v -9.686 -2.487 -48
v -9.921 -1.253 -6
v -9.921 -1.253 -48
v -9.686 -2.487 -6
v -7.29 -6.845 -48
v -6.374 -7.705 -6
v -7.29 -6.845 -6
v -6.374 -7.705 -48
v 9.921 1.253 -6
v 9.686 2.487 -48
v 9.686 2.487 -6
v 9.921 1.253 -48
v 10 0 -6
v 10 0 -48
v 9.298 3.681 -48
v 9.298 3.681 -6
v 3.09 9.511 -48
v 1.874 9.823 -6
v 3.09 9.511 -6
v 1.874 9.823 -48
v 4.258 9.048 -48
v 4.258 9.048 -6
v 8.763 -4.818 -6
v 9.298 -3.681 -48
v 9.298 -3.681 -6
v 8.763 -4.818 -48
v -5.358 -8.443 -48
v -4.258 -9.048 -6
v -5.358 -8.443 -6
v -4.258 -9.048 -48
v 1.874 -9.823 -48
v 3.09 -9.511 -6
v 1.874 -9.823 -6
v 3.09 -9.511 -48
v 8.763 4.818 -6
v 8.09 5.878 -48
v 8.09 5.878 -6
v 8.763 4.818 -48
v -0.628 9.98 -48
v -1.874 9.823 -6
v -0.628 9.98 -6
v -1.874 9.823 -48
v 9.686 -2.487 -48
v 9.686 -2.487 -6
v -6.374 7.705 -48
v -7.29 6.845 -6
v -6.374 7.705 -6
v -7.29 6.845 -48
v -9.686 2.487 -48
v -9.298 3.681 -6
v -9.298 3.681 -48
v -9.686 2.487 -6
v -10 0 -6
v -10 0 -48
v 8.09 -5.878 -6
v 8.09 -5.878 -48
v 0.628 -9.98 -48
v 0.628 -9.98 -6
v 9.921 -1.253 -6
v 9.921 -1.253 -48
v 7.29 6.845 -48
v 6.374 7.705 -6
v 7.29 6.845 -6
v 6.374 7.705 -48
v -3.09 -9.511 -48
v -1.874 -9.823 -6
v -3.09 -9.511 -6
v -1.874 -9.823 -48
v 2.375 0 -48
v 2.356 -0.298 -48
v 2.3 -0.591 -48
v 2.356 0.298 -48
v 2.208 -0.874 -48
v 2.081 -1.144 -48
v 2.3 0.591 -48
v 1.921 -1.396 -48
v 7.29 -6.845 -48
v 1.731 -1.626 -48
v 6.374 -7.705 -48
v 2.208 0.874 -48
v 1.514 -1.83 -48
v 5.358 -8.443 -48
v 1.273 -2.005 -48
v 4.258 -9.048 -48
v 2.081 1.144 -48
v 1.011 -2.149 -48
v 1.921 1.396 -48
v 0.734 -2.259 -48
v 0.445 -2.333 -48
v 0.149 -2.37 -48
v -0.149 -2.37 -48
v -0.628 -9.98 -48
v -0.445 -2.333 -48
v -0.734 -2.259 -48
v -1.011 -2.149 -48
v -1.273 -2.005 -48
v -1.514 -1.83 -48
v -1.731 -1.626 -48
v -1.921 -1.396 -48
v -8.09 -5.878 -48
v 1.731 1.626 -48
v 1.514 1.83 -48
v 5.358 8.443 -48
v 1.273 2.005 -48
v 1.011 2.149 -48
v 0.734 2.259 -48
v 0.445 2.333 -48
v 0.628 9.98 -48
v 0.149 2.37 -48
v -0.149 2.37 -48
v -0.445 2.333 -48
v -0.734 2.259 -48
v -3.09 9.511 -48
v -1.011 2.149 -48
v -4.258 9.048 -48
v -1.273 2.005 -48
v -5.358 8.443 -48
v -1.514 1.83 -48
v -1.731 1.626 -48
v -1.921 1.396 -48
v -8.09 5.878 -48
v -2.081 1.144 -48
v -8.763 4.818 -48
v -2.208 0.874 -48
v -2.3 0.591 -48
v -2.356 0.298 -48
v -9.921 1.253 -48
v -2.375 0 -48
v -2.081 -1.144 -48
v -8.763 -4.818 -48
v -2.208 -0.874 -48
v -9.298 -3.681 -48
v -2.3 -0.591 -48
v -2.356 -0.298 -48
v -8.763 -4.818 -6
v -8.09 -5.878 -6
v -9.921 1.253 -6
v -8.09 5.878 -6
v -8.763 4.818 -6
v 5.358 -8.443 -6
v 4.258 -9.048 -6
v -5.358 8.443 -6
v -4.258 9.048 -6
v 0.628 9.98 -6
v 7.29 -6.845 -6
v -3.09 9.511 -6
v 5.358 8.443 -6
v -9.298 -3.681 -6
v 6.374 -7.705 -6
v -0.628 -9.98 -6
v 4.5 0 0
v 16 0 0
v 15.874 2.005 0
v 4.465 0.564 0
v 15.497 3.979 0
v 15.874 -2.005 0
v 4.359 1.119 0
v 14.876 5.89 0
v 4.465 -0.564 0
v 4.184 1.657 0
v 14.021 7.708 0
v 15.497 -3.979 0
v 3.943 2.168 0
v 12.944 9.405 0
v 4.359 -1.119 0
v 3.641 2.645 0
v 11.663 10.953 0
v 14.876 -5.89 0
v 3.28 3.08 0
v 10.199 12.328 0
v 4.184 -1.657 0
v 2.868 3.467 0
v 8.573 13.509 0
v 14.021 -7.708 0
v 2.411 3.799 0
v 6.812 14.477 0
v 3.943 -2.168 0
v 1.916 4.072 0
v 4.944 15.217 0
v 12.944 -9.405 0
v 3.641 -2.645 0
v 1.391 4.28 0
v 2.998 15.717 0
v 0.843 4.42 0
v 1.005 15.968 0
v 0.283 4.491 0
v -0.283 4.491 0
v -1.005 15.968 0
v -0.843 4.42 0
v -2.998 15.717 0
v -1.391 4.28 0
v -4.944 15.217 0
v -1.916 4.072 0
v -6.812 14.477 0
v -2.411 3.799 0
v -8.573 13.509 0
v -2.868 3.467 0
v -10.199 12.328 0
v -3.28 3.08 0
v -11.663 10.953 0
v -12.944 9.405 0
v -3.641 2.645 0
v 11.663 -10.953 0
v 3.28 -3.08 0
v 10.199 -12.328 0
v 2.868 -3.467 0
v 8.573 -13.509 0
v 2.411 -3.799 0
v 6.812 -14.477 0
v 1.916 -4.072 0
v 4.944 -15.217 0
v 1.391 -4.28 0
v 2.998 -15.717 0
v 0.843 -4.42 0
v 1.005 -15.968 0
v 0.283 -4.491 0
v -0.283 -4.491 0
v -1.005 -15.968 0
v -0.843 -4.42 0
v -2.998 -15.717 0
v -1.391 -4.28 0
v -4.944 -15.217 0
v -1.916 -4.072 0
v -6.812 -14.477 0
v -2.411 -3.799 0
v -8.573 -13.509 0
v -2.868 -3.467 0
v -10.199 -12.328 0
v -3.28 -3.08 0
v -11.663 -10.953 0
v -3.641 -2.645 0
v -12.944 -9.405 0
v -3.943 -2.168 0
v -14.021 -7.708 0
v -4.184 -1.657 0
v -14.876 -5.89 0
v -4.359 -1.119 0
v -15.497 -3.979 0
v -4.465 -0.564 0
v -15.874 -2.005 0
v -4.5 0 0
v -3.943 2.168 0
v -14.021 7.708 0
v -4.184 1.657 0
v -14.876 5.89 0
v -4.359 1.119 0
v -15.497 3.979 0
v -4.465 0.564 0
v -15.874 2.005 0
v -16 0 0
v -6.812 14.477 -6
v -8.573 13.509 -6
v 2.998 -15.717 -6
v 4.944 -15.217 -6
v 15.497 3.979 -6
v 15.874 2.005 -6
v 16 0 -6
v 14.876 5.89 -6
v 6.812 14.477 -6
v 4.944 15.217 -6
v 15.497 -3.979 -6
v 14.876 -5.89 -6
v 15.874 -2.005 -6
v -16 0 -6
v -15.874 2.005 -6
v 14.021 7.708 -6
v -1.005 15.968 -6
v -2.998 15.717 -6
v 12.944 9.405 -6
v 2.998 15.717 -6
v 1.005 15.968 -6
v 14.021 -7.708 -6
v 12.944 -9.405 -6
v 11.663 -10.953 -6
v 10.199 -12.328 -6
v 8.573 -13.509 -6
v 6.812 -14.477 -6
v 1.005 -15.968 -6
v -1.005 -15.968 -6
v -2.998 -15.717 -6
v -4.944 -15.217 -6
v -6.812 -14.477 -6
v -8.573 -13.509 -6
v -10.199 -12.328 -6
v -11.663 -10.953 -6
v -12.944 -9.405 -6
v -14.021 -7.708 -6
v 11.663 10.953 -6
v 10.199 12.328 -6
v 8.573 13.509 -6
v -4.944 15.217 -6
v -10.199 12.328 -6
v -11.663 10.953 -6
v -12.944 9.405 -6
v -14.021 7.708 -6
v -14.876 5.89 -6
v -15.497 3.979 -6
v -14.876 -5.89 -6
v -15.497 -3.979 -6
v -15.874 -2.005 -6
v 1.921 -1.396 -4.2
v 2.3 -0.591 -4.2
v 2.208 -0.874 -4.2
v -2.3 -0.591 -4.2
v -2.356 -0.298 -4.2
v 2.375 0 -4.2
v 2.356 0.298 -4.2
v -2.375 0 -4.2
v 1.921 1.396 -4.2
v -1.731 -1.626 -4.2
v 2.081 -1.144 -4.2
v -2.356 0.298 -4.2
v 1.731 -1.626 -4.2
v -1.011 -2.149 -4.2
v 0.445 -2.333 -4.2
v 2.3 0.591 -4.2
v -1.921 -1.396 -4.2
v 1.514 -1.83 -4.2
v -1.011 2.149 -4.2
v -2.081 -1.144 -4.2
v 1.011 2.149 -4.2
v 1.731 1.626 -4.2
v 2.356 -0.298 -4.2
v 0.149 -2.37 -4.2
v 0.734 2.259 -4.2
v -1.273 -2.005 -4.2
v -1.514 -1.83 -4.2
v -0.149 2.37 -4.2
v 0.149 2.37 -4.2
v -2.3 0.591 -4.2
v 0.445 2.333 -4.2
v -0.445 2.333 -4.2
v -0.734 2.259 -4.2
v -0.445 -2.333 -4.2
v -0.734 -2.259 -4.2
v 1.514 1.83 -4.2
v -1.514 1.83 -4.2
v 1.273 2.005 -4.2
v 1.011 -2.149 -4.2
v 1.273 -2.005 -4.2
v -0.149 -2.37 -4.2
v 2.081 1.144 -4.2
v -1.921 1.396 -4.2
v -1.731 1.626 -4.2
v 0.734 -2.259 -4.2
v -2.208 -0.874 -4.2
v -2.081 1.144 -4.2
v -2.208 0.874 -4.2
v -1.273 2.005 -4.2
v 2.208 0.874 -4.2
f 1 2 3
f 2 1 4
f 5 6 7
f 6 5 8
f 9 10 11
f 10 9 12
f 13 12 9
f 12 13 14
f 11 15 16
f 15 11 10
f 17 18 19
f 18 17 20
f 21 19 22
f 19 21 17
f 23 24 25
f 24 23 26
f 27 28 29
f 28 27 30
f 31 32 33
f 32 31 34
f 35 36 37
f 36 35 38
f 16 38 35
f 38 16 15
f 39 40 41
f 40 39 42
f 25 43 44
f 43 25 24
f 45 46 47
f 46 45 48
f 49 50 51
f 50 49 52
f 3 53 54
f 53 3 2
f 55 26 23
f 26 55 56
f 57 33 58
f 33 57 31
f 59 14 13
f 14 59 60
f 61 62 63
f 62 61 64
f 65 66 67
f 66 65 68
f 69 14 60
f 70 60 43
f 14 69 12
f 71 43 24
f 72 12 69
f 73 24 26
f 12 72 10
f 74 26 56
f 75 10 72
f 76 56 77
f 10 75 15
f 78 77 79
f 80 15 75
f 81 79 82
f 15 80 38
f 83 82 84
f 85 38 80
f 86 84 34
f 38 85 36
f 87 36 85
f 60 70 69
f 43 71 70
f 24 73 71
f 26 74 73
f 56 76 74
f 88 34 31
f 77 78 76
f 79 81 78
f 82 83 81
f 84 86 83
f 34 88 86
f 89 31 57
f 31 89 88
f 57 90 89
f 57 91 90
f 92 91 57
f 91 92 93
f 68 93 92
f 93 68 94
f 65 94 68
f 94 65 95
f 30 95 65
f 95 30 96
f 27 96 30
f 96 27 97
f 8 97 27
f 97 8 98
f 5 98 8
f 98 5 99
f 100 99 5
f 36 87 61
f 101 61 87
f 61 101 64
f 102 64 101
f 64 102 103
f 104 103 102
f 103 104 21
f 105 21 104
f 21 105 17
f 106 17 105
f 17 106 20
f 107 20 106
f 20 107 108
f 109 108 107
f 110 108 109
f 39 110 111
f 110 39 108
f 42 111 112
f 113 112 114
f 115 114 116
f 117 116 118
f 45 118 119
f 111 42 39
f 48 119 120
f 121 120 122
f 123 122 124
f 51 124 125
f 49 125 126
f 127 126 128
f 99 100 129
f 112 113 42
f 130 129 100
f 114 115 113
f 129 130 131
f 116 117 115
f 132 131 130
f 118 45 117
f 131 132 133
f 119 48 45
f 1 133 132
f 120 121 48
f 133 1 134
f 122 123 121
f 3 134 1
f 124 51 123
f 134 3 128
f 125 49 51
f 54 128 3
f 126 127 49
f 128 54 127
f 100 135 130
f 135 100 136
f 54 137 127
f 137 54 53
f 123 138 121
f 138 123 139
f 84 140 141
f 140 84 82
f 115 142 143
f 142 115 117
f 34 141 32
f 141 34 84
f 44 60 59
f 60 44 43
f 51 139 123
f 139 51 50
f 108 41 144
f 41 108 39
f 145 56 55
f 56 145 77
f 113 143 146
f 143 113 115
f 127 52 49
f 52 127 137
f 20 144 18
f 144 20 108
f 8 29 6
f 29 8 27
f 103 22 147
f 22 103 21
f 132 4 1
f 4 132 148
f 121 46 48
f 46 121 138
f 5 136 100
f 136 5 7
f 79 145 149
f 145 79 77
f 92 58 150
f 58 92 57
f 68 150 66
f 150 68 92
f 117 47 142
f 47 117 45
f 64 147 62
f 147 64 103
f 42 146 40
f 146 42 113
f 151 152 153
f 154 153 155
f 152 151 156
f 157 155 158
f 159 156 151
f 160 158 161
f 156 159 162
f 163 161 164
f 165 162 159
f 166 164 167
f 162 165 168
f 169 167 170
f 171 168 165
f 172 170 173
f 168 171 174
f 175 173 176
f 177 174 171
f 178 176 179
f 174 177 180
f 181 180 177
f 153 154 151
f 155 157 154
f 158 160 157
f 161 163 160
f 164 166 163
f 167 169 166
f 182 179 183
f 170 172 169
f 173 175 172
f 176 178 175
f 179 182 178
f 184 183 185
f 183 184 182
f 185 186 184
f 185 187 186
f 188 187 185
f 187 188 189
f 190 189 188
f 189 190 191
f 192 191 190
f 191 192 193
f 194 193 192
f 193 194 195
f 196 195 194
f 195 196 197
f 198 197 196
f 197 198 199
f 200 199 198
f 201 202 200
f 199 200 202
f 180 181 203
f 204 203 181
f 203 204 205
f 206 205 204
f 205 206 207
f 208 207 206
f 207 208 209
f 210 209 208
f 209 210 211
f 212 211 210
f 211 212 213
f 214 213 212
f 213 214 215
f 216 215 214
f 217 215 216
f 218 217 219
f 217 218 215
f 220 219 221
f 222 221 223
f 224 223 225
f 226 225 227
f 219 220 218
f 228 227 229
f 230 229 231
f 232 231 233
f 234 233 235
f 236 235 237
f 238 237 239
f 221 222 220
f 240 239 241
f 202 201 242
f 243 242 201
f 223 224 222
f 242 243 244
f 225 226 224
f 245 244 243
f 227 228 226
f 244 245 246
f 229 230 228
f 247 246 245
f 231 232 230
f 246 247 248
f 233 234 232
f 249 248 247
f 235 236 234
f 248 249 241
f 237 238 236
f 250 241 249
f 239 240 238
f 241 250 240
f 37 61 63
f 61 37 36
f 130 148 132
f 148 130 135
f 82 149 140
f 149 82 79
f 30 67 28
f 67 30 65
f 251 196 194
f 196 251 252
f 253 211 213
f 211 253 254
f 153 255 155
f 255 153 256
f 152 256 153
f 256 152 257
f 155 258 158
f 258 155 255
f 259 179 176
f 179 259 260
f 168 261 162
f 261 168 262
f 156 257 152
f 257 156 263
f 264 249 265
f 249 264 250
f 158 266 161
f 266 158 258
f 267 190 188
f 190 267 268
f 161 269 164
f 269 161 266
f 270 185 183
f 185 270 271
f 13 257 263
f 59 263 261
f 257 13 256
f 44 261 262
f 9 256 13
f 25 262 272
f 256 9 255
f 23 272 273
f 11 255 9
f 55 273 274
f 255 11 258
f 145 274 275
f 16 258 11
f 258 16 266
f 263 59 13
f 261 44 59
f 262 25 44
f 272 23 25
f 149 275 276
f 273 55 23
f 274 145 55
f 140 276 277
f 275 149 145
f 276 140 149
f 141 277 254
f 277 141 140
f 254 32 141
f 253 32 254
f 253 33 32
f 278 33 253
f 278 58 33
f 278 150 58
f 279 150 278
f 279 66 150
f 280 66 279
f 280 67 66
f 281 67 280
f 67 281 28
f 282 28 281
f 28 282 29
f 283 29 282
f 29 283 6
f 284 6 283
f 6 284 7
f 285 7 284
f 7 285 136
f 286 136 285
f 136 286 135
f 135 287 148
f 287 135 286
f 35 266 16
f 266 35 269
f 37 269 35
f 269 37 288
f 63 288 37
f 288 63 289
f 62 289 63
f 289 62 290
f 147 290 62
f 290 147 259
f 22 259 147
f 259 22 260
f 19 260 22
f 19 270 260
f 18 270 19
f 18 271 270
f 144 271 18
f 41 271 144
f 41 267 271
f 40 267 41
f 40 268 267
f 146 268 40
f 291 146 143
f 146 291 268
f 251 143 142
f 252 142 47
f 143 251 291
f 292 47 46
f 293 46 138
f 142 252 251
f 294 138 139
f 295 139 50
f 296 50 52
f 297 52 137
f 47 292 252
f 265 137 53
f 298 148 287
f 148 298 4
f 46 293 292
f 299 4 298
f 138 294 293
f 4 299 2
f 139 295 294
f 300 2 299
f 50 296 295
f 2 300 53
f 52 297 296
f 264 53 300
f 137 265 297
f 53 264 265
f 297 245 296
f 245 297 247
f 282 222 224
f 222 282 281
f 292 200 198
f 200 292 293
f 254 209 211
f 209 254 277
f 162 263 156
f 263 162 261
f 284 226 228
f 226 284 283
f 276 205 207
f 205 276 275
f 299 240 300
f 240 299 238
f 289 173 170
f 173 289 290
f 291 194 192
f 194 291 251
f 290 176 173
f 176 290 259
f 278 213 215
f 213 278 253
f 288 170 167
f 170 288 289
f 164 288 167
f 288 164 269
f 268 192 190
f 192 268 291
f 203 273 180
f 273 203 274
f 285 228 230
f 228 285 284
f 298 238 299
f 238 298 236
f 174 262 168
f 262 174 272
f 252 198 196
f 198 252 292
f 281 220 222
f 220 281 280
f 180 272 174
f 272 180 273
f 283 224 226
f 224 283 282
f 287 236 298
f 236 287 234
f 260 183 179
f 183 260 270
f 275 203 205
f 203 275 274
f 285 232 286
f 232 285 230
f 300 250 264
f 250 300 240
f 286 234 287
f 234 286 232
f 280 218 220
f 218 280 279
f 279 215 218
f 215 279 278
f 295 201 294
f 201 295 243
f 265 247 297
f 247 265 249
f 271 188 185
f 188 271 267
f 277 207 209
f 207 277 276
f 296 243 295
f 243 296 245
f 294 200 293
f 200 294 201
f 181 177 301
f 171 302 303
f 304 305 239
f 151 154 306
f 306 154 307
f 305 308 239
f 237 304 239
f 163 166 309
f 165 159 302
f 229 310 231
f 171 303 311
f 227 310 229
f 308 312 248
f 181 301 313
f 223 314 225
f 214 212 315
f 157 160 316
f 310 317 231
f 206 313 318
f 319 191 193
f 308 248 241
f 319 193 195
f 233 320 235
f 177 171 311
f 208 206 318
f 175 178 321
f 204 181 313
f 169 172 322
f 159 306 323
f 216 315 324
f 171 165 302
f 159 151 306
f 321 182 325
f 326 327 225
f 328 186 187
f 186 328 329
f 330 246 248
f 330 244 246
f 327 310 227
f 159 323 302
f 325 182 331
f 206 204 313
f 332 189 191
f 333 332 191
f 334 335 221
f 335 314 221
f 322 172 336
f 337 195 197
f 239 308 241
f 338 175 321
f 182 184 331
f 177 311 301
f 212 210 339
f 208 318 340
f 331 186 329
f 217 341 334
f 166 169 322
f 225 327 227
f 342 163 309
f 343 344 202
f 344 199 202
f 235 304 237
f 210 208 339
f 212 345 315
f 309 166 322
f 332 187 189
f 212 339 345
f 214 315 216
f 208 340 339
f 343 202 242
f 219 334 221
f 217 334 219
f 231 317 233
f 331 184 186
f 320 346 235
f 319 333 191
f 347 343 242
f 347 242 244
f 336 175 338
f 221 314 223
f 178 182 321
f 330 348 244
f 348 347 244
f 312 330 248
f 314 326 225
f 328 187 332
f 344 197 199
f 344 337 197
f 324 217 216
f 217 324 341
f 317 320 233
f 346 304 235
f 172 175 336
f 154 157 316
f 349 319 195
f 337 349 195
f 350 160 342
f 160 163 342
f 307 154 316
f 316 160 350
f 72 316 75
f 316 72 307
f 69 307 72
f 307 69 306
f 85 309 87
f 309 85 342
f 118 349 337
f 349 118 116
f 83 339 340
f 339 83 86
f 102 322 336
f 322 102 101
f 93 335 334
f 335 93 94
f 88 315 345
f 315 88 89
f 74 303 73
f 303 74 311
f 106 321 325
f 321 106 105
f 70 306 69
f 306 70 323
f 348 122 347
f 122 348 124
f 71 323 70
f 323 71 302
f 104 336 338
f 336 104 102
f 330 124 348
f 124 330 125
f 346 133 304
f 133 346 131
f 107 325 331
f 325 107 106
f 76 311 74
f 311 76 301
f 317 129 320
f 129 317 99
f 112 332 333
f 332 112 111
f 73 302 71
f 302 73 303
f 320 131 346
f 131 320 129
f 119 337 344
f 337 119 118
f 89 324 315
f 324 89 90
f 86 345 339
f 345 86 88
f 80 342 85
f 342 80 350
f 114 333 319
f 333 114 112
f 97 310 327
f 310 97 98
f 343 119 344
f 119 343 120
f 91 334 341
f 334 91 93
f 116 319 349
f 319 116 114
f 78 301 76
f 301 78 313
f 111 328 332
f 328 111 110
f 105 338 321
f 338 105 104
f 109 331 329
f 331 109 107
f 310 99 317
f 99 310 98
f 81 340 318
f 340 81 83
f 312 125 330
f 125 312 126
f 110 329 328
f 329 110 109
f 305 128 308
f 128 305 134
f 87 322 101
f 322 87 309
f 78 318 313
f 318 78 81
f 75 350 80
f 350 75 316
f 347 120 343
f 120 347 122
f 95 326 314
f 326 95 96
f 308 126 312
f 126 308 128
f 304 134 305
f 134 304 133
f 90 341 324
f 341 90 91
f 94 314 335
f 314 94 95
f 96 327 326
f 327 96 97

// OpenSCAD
$fn = 50;


difference() {
	union() {
		translate(v = [0, 0, -48.0000000000]) {
			cylinder(h = 48, r = 10.0000000000);
		}
		translate(v = [0, 0, -6.0000000000]) {
			cylinder(h = 6, r = 16.0000000000);
		}
	}
	union() {
		translate(v = [0, 0, 0]) {
			rotate(a = [0, 0, 0]) {
				difference() {
					union() {
						#translate(v = [0, 0, -48.0000000000]) {
							cylinder(h = 48, r = 2.2500000000);
						}
						#translate(v = [0, 0, -4.2000000000]) {
							cylinder(h = 4.2000000000, r = 10.0000000000, r1 = 2.3750000000, r2 = 4.5000000000);
						}
						#translate(v = [0, 0, -48.0000000000]) {
							cylinder(h = 48, r = 2.3750000000);
						}
						#translate(v = [0, 0, -48.0000000000]) {
							cylinder(h = 48, r = 2.2500000000);
						}
					}
					union();
				}
			}
		}
	}
}
